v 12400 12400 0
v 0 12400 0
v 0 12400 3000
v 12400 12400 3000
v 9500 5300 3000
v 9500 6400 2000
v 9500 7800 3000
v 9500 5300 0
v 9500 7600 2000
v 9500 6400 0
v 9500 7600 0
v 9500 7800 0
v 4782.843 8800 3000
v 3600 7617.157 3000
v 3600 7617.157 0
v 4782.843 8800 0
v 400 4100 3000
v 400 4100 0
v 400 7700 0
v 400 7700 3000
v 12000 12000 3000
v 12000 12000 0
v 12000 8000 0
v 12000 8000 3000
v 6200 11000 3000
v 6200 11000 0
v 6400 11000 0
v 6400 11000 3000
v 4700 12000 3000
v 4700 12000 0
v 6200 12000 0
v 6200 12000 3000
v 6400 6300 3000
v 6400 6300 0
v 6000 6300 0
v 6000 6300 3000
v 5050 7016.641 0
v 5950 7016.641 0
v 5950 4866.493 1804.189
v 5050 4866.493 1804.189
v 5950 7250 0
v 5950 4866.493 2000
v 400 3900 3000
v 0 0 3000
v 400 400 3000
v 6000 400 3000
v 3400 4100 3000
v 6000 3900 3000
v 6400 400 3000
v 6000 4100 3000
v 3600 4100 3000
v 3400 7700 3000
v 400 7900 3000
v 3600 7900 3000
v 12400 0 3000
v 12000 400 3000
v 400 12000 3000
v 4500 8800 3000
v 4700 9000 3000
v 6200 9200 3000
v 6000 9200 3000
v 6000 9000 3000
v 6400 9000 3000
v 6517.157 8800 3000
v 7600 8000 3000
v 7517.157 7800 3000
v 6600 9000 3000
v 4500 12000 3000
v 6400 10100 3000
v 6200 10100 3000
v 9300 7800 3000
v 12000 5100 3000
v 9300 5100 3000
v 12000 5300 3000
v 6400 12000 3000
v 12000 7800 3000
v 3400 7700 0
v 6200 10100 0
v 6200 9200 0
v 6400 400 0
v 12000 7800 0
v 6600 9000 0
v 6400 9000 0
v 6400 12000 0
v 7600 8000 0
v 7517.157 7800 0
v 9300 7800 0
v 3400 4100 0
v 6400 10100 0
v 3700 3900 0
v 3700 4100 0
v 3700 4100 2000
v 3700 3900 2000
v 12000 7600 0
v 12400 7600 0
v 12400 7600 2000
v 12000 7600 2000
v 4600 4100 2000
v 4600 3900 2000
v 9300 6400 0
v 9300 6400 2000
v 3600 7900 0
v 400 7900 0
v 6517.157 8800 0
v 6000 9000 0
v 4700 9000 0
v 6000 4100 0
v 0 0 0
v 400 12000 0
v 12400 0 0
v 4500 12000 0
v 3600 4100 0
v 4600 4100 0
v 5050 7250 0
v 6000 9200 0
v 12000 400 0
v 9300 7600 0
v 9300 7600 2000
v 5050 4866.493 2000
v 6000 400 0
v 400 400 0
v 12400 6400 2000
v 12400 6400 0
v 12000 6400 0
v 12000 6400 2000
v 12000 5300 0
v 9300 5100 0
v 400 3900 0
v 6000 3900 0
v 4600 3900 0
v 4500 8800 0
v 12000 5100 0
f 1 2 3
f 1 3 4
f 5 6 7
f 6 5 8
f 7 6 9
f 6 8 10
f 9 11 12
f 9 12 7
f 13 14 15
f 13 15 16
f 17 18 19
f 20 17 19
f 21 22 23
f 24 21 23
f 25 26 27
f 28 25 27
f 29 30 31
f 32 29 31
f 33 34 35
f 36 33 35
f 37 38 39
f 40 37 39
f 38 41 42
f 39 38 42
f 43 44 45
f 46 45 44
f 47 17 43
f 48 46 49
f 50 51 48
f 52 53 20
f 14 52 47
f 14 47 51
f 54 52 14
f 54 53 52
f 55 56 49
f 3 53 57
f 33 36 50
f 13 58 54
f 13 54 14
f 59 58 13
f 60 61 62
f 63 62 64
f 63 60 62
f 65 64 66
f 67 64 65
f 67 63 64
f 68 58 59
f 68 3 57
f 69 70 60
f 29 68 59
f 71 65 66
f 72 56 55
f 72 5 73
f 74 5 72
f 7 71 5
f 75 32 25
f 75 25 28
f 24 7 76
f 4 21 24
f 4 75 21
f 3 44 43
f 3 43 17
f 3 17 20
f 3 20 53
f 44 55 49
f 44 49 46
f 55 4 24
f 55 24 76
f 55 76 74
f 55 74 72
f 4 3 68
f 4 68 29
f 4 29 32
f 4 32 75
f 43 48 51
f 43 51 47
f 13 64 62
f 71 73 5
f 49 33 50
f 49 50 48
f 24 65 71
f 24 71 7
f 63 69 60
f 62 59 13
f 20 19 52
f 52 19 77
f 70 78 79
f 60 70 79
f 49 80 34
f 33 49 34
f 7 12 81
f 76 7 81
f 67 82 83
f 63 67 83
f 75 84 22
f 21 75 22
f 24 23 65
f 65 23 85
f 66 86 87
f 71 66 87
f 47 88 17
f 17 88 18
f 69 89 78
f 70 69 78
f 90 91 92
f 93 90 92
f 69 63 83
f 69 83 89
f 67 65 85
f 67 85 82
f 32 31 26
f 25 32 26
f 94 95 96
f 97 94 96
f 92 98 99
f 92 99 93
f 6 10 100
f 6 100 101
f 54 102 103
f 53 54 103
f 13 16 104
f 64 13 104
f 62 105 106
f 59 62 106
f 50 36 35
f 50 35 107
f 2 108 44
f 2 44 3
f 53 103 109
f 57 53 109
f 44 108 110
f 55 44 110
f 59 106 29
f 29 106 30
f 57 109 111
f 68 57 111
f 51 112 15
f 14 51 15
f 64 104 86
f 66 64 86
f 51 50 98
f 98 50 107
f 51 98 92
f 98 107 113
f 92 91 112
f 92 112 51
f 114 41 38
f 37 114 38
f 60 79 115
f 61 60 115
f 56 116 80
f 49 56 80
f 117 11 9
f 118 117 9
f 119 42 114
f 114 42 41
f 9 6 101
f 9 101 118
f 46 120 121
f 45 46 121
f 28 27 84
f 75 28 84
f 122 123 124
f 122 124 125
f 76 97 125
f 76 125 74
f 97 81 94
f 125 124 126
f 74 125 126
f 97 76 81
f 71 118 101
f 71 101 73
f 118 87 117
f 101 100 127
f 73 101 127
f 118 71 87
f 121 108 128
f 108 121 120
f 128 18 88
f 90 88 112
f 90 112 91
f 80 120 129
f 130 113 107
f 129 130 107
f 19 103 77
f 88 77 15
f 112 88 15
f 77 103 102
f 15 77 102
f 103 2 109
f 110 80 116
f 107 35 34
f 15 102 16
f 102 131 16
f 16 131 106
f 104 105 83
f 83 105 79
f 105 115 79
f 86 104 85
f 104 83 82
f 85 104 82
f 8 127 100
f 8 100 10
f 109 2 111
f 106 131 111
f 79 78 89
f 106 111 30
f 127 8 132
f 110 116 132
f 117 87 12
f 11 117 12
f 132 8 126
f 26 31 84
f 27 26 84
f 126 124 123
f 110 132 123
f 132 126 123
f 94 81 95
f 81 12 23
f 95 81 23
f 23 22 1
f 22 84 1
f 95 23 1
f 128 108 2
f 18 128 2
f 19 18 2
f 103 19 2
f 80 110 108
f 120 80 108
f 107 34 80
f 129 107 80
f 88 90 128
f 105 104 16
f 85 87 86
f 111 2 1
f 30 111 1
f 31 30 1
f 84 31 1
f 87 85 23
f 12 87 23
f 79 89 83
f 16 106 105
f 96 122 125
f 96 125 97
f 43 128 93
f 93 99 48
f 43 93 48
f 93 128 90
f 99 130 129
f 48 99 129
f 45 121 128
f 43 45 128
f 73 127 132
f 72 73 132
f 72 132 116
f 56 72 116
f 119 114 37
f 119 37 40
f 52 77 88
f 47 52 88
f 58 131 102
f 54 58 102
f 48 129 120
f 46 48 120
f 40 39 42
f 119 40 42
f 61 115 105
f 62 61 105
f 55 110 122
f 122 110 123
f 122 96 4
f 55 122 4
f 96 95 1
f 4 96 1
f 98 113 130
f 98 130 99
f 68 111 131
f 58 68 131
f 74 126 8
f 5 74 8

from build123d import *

# Parameters (mm, degrees)
F0_W      = 12400
F0_H      = 12400
F1_DEPTH  = 3000
F2_W      = 1200
F2_H      = 2000
F3_DEPTH  = 6000
F4_W      = 1300
F4_H      = 2000
F5_DEPTH  = 2800
F6_W      = 900
F6_H      = 2000
F7_DEPTH  = 200
F10_DEPTH = 900


# Not quite as in the source:
# - a feature names something its author has since deleted; it is built from what else it names


with BuildPart() as f1:
    # F0 (on Top) → F1 (new body)
    with BuildSketch(Plane.XY):
        with Locations((6200, 6200)):
            Rectangle(F0_W, F0_H)
        Polygon((6000, 400), (400, 400), (400, 3900), (400, 4100), (400, 7700), (400, 7900), (400, 12000), (4500, 12000), (4700, 12000), (6000, 12000), (6200, 12000), (6200, 11000), (6400, 11000), (6400, 12000), (12000, 12000), (12000, 8000), (12000, 7800), (12000, 5300), (12000, 5100), (12000, 400), (6400, 400), (6400, 6300), (6000, 6300), (6000, 4100), (6000, 3900), align=None, mode=Mode.SUBTRACT)
        Polygon((400, 7900), (400, 7700), (3400, 7700), (3400, 4100), (3600, 4100), (3600, 7617.1572875254), (4782.8427124746, 8800), (6517.1572875254, 8800), (7517.1572875254, 7800), (9300, 7800), (9300, 5100), (12000, 5100), (12000, 5300), (9500, 5300), (9500, 7800), (12000, 7800), (12000, 8000), (7600, 8000), (6600, 9000), (6400, 9000), (6400, 10100), (6200, 10100), (6200, 9200), (6000, 9200), (6000, 9000), (4700, 9000), (4700, 12000), (4500, 12000), (4500, 8800), (3600, 7900), align=None)
        Polygon((400, 4100), (400, 3900), (6000, 3900), (6000, 4100), (3600, 4100), (3400, 4100), align=None)
    extrude(amount=F1_DEPTH)

    # F2 (on face) → F3 (cut, through all)
    with BuildSketch(Plane.YZ.offset(12400)):
        with Locations((7000, 1000)):
            Rectangle(F2_W, F2_H)
    extrude(amount=-F3_DEPTH, mode=Mode.SUBTRACT)

    # F4 (on face) → F5 (cut, through all)
    with BuildSketch(Plane.YZ.offset(6400)):
        with Locations((6950, 1000)):
            Rectangle(F4_W, F4_H)
    extrude(amount=-F5_DEPTH, mode=Mode.SUBTRACT)

    # F6 (on face) → F7 (cut, through all)
    with BuildSketch(Plane(origin=(0, 4100, 0), x_dir=(-1, 0, 0), z_dir=(0, 1, 0))):
        with Locations((-4150, 1000)):
            Rectangle(F6_W, F6_H)
    extrude(amount=-F7_DEPTH, mode=Mode.SUBTRACT)


with BuildPart() as f10:
    # F9 (on plane+point) → F10 (new body)
    with BuildSketch(Plane(origin=(5950, 0, 0), x_dir=(0, -1, 0), z_dir=(-1, 0, 0))):
        Polygon((-4866.4928148116, 2000), (-7250, 0), (-7016.6414259709, 0), (-4866.4928148116, 1804.1889066002), align=None)
    extrude(amount=F10_DEPTH)


solid = Compound([f1.part, f10.part])
